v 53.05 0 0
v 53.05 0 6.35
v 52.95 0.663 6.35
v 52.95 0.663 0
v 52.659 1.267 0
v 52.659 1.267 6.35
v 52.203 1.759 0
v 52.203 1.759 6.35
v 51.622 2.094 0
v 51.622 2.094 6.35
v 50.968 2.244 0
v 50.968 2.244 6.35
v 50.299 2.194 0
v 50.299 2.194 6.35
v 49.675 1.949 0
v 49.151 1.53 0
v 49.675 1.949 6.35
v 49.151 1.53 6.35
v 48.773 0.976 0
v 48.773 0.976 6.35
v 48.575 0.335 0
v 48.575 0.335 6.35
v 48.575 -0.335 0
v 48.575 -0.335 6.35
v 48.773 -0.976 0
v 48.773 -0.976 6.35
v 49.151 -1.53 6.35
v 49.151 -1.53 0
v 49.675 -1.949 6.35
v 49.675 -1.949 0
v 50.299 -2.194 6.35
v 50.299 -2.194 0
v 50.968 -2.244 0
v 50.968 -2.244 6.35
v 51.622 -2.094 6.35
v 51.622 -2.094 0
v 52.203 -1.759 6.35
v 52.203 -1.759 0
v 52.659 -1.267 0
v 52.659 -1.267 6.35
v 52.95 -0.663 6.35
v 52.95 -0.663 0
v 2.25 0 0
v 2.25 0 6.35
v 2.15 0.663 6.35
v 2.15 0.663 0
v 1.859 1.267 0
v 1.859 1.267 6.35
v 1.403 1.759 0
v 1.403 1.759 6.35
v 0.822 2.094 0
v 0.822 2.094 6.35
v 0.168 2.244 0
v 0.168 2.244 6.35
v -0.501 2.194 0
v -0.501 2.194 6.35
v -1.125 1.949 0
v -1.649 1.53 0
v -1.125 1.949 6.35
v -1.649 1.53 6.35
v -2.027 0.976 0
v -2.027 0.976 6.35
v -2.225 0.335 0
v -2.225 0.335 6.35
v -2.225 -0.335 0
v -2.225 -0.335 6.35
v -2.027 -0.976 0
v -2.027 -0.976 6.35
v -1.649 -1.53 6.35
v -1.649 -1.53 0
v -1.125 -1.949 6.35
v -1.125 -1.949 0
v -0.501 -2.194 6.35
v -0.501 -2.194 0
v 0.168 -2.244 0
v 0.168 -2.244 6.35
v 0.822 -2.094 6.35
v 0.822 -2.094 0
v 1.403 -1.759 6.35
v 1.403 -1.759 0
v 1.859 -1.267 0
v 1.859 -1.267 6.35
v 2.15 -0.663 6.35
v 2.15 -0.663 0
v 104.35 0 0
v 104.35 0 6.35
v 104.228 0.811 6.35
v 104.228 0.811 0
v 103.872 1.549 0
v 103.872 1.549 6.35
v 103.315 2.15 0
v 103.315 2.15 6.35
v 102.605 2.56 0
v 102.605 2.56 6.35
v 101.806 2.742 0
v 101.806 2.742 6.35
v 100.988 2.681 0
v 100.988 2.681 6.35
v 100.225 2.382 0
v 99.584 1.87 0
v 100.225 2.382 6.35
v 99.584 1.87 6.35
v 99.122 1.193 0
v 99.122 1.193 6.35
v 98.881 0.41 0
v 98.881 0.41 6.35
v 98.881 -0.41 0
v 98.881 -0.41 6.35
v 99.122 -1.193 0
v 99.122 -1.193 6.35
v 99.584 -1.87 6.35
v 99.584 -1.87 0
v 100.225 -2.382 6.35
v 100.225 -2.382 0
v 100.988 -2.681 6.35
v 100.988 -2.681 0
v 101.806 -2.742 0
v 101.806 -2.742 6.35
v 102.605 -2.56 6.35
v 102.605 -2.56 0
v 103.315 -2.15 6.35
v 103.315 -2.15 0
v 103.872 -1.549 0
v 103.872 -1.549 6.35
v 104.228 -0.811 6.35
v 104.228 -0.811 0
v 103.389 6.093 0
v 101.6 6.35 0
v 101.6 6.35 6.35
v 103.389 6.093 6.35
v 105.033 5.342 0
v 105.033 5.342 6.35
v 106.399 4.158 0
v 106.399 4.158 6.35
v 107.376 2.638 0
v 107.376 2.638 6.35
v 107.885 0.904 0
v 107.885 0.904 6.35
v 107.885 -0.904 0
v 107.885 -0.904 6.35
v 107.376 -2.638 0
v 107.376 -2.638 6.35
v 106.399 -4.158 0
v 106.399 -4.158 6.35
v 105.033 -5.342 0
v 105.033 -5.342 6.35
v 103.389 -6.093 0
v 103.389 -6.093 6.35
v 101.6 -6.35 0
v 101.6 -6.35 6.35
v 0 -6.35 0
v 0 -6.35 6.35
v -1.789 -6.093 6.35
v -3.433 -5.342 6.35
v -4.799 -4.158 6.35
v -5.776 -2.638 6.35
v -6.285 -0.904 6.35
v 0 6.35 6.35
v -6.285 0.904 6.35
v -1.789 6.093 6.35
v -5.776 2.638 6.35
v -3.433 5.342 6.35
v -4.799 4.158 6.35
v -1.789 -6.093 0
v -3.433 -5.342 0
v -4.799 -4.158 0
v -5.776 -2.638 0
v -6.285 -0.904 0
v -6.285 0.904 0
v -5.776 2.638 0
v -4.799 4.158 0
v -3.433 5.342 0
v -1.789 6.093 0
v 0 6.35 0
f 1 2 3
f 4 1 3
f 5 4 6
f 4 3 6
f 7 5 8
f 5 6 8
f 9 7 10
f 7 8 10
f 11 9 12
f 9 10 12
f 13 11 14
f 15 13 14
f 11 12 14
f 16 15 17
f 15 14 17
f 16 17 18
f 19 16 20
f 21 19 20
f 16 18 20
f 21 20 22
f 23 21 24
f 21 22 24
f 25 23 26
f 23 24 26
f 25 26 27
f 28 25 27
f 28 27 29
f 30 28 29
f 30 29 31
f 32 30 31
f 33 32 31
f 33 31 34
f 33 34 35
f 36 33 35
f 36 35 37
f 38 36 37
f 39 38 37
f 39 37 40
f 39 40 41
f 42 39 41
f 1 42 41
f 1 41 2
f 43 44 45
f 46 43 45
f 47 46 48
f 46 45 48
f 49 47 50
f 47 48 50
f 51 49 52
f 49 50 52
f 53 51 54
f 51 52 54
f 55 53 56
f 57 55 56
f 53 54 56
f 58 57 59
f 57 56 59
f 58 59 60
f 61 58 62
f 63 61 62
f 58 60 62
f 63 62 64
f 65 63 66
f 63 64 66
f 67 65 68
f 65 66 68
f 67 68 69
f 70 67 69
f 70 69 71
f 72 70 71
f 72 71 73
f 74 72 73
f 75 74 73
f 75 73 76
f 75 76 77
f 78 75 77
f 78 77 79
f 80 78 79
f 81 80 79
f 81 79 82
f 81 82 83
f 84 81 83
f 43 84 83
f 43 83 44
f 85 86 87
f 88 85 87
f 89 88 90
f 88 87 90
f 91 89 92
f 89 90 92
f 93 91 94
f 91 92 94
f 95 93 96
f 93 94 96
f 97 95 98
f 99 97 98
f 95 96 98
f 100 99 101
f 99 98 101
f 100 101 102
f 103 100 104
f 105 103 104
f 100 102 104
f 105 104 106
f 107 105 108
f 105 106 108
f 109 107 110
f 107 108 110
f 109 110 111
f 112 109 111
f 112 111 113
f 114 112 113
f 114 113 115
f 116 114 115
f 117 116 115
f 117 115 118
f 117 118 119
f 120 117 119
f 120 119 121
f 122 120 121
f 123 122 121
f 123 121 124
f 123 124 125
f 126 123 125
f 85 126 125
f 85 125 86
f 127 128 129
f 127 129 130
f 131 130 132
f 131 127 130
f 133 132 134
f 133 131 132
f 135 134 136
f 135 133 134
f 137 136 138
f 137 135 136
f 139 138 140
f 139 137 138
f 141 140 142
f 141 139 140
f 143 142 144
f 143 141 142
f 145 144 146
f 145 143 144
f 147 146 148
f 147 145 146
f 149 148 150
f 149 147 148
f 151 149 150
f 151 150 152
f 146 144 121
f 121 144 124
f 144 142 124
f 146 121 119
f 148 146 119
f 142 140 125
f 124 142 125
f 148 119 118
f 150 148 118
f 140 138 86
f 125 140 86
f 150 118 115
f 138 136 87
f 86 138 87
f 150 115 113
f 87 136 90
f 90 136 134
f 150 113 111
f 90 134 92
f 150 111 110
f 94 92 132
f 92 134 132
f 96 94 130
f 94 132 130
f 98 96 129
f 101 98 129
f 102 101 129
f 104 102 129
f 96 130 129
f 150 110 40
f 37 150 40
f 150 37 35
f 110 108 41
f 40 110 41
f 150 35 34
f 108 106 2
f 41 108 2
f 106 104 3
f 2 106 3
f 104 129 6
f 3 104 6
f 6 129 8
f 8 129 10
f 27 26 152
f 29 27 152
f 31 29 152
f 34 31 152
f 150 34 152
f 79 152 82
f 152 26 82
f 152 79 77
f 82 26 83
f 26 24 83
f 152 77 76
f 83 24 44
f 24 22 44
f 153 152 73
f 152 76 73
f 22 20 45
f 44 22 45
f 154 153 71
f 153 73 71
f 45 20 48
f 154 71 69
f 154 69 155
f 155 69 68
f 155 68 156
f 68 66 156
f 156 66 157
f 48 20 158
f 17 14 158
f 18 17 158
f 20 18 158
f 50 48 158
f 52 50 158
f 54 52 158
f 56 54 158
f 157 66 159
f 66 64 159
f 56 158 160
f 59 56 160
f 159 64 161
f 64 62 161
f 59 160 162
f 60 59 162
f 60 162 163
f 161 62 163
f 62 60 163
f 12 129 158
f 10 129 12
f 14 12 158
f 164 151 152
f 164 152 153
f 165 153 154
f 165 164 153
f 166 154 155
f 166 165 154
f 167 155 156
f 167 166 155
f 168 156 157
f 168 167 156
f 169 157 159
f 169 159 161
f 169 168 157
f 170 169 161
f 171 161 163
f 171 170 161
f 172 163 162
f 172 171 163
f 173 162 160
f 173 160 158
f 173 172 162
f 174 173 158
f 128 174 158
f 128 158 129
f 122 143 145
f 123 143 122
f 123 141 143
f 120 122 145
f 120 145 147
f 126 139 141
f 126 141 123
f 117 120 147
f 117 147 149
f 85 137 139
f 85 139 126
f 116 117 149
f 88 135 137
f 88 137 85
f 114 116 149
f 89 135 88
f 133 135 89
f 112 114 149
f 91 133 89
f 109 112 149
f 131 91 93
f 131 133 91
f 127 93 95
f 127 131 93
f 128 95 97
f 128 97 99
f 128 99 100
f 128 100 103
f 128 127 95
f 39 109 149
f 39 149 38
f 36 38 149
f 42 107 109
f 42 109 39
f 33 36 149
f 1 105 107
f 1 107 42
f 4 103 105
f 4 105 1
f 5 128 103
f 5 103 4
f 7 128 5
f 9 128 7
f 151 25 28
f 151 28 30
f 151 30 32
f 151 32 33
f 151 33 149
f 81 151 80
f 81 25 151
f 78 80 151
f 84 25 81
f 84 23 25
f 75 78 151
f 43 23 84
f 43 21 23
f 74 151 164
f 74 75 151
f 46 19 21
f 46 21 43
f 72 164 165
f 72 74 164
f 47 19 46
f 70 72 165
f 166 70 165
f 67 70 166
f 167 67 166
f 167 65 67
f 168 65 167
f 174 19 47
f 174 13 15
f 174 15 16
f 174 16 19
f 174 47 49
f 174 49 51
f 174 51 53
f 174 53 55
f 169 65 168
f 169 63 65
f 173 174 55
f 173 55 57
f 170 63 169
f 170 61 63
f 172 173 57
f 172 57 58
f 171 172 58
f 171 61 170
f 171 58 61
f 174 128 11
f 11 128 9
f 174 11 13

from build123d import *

# Parameters (mm, degrees)
BOSS_EXTRUDE1_DEPTH  = 6.35
M5_CLEARANCE_HOLE1_D = 5.5
M4_CLEARANCE_HOLE1_D = 4.5


with BuildPart() as part:
    # Sketch1 → Boss-Extrude1 (new body)
    with BuildSketch(Plane.XY):
        with BuildLine():
            Line((0, 6.35), (101.6, 6.35))
            ThreePointArc((101.6, 6.35), (107.95, 0), (101.6, -6.35))
            Line((101.6, -6.35), (0, -6.35))
            ThreePointArc((0, -6.35), (-6.35, 0), (0, 6.35))
        make_face()
    extrude(amount=BOSS_EXTRUDE1_DEPTH)

    # M5 Clearance Hole1 (through all)
    with Locations(Plane(origin=(0, 0, 0), x_dir=(-1, 0, 0), z_dir=(0, 0, -1))):
        with Locations((-101.6, 0)):
            Hole(M5_CLEARANCE_HOLE1_D / 2)

    # M4 Clearance Hole1 (through all)
    with Locations(Plane(origin=(0, 0, 0), x_dir=(-1, 0, 0), z_dir=(0, 0, -1))):
        with Locations((-50.8, 0), (0, 0)):
            Hole(M4_CLEARANCE_HOLE1_D / 2)


solid = part.part
